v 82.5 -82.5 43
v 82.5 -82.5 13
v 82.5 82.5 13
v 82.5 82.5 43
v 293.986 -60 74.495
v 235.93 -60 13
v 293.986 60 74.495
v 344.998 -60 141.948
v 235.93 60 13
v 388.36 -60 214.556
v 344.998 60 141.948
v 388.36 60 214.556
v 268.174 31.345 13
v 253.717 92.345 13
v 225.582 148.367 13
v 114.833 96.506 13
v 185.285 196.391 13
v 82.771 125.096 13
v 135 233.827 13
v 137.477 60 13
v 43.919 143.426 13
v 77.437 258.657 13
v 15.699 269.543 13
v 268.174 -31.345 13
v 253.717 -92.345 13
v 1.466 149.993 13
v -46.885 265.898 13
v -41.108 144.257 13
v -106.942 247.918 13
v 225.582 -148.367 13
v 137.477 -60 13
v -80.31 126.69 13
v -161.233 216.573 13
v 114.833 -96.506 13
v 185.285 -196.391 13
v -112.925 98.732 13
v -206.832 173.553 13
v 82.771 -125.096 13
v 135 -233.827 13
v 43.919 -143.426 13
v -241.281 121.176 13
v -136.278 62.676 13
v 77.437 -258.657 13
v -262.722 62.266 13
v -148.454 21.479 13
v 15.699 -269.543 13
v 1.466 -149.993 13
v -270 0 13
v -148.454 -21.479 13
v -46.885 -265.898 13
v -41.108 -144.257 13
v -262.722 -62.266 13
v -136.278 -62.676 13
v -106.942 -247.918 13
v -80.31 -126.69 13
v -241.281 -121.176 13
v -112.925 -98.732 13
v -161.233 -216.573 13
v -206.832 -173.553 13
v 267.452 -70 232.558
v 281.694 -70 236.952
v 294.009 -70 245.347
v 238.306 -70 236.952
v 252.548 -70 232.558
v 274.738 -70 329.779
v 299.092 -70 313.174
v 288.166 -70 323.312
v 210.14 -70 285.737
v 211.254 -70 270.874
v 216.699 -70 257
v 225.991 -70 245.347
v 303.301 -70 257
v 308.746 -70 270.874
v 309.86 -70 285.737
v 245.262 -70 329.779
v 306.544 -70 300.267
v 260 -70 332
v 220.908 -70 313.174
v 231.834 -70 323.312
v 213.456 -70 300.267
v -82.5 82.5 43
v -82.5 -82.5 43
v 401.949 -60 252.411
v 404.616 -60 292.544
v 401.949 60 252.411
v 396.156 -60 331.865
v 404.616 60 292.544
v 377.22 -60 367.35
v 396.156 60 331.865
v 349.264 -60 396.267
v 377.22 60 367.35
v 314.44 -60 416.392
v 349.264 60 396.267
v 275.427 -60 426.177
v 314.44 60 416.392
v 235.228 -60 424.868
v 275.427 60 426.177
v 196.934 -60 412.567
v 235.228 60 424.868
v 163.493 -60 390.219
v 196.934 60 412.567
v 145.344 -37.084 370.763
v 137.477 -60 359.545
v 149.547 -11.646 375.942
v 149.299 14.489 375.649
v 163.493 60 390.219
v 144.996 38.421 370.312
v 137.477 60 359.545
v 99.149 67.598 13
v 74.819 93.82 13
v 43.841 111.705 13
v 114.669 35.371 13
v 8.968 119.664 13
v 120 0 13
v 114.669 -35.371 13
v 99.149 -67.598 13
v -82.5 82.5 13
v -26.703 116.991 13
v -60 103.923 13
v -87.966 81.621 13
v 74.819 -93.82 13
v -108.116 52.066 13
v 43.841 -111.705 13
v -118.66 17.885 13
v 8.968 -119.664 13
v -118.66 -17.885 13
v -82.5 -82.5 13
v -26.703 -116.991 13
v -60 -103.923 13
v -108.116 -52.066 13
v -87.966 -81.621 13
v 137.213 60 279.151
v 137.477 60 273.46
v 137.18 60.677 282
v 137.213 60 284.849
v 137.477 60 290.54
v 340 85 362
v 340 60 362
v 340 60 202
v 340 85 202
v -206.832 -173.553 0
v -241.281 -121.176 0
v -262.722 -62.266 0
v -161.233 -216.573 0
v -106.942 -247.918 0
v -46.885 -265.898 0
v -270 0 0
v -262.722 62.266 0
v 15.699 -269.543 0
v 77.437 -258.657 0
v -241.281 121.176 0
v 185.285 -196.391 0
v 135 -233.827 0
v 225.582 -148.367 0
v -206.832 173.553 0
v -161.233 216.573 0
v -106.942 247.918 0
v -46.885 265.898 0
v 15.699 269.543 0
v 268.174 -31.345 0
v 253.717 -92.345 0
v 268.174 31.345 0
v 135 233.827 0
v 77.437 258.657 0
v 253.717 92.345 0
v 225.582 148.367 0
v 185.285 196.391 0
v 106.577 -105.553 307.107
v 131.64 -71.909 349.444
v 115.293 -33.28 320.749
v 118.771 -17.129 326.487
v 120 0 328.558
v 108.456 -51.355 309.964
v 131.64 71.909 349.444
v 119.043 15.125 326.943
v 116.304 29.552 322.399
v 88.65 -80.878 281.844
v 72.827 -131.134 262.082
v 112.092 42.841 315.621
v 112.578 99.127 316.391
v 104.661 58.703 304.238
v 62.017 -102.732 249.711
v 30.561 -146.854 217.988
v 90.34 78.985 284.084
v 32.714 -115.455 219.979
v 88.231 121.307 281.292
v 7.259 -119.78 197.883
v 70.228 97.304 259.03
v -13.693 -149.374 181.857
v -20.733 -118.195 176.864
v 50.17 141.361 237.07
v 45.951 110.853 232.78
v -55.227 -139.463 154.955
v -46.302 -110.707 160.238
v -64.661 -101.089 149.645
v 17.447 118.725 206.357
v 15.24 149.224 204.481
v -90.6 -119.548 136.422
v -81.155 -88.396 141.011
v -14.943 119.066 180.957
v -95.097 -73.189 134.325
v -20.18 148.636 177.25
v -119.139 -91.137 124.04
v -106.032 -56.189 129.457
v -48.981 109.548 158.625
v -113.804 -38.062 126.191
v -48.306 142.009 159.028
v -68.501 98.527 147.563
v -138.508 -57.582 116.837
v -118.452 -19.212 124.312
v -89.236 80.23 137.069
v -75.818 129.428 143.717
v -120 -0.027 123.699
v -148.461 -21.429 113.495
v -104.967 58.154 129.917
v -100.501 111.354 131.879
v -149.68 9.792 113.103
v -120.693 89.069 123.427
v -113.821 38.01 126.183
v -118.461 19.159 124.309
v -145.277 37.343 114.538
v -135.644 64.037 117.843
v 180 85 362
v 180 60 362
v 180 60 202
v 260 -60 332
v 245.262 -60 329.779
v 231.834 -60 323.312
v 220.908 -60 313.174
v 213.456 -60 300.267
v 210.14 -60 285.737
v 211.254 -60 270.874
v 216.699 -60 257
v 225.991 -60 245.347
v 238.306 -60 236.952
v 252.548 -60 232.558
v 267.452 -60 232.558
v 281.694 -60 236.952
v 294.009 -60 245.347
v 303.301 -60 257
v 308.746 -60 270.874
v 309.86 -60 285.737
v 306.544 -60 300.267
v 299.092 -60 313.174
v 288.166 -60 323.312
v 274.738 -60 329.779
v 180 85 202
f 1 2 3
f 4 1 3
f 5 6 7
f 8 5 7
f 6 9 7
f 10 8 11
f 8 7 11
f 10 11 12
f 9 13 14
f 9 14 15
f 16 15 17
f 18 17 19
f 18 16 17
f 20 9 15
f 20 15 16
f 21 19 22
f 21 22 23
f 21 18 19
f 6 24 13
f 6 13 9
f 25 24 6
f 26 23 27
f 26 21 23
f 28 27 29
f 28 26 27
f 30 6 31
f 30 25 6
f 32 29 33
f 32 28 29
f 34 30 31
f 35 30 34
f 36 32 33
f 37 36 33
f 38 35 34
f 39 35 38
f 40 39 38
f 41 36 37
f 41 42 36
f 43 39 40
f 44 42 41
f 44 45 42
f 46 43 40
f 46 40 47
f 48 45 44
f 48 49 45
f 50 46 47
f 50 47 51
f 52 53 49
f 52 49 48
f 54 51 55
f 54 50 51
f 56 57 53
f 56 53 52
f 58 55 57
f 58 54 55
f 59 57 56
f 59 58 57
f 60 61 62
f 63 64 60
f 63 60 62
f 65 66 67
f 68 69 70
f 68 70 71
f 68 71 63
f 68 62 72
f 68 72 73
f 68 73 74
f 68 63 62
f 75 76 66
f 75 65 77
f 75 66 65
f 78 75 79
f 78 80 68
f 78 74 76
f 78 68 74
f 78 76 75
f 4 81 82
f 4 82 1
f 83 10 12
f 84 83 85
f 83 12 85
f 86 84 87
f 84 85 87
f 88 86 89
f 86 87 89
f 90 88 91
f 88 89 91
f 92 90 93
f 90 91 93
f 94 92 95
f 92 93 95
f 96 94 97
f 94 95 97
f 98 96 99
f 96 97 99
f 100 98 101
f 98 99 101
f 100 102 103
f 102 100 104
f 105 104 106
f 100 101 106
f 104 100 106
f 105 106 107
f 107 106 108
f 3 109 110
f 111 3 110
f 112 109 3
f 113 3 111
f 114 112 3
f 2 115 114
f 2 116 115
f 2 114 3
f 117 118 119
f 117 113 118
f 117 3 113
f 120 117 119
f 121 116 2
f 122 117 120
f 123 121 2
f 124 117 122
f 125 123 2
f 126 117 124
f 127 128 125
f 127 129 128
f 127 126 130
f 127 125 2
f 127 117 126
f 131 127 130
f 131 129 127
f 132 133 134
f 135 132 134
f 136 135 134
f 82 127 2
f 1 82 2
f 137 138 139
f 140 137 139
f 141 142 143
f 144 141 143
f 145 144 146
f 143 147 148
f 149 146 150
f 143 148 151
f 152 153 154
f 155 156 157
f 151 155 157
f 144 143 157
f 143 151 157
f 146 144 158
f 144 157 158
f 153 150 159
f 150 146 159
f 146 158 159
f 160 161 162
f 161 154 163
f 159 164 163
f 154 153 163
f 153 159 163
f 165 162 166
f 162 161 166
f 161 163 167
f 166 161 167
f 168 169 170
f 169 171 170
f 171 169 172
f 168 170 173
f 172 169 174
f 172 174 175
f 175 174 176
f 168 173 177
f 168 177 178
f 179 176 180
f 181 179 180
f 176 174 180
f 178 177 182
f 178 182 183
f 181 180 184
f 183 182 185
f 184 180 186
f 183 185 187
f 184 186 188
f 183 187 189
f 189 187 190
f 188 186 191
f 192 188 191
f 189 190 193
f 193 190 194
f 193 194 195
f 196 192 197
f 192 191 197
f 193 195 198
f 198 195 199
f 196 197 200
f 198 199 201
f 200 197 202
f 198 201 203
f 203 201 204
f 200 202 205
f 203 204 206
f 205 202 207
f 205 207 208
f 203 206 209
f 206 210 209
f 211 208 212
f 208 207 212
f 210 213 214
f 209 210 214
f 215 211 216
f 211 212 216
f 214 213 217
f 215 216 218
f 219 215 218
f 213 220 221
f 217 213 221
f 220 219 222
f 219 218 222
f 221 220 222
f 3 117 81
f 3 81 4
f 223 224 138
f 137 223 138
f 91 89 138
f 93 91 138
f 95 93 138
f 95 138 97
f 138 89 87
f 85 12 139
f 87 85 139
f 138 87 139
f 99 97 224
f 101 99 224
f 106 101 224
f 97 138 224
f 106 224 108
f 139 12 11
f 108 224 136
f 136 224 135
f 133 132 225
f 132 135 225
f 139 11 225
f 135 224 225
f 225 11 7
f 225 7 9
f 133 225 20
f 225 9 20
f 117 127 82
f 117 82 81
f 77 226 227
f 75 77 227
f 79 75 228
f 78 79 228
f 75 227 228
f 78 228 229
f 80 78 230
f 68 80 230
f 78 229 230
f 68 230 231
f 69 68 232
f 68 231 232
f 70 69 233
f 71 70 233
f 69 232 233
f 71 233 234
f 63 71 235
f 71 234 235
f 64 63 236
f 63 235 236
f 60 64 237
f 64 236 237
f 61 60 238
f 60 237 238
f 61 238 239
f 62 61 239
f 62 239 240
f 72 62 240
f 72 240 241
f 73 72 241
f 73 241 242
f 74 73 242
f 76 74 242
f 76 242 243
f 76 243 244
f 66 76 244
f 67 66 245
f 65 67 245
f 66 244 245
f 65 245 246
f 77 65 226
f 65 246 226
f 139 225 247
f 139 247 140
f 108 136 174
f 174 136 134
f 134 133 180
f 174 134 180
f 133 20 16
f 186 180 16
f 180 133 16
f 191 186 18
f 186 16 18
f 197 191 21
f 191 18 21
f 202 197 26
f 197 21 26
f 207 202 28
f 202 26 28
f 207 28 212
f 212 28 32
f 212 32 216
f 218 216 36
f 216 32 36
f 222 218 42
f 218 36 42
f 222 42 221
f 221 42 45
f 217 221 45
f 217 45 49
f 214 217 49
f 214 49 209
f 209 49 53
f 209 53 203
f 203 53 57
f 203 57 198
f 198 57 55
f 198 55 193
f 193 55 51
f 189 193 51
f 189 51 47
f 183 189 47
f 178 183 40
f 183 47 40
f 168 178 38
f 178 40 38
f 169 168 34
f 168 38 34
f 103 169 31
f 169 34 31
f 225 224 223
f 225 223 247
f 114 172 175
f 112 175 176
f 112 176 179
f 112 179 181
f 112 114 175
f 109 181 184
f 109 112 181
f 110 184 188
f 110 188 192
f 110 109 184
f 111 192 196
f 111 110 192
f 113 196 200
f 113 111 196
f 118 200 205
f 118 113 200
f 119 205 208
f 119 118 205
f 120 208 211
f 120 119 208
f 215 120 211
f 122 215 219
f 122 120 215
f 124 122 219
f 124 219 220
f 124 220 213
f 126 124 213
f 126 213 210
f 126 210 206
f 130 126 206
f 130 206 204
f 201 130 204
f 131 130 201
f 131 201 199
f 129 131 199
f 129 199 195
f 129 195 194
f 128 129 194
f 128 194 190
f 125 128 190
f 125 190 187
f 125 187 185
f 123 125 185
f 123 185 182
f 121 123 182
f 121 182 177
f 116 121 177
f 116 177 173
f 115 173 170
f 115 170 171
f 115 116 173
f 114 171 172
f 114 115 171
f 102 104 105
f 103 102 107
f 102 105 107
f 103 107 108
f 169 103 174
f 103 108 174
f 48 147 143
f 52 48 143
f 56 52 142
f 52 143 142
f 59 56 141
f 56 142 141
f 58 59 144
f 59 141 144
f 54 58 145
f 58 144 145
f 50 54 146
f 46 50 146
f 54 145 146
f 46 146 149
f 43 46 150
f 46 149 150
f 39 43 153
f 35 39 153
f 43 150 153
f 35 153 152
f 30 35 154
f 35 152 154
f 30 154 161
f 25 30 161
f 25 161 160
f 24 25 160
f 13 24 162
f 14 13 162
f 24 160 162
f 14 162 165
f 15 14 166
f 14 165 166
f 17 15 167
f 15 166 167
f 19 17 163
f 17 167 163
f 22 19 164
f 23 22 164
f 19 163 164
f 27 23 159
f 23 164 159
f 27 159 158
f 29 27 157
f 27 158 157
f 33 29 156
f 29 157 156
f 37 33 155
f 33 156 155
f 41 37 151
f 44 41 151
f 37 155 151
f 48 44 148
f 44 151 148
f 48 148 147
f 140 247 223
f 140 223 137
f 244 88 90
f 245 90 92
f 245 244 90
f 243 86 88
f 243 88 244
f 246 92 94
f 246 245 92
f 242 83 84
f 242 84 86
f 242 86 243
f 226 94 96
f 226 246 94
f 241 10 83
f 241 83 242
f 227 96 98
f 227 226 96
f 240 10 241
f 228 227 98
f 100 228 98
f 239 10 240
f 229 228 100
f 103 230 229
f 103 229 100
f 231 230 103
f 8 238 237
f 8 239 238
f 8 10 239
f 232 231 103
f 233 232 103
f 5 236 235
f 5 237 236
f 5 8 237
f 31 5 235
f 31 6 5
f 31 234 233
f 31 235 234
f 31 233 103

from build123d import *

# Parameters (mm, degrees)
SKETCH_1_R           = 270
EXTRUDE_1_DEPTH      = 13
SKETCH_2_R           = 150
SKETCH_2_R_2         = 120
EXTRUDE_2_DEPTH      = 400
CUT_EXTRUDE_1_DEPTH  = 220
EXTRUDE_3_DEPTH      = 60
SKETCH_27_W          = 165
SKETCH_27_H          = 165
EXTRUDE_14_DEPTH     = 30
SKETCH_51_R          = 122.82
CUT_EXTRUDE_20_DEPTH = 25
SKETCH_52_W          = 160
SKETCH_52_H          = 160
EXTRUDE_33_DEPTH     = 25
SKETCH_53_R          = 50
EXTRUDE_34_DEPTH     = 10


with BuildPart() as part:
    # 草图1 → 凸台-拉伸1 (new body)
    with BuildSketch(Plane.XY):
        with Locations(Location((0, 0, 0), (0, 0, 180))):
            Circle(SKETCH_1_R)
    extrude(amount=EXTRUDE_1_DEPTH)

    # 草图2 → 凸台-拉伸2 (add)
    with BuildSketch(Plane.XY):
        Circle(SKETCH_2_R)
        Circle(SKETCH_2_R_2, mode=Mode.SUBTRACT)
    extrude(amount=EXTRUDE_2_DEPTH)

    # 草图4 → 切除-拉伸1 (cut, symmetric)
    with BuildSketch(Plane(origin=(0, 0, 0), x_dir=(1, 0, 0), z_dir=(0, 1, 0))):
        with BuildLine():
            Line((-150, -113), (-150, -400))
            Line((-150, -400), (175.732568569, -400))
            ThreePointArc((175.732568569, -400), (150.72256284, -377.307091697), (131.640141985, -349.444398214))
            ThreePointArc((131.640141985, -349.444398214), (14.085885106, -203.509183955), (-150, -113))
        make_face()
    extrude(amount=CUT_EXTRUDE_1_DEPTH, both=True, mode=Mode.SUBTRACT)

    # 草图5 → 凸台-拉伸3 (add, symmetric)
    with BuildSketch(Plane(origin=(0, 0, 0), x_dir=(1, 0, 0), z_dir=(0, 1, 0))):
        with BuildLine():
            Line((131.640141985, -13), (235.929592589, -13))
            ThreePointArc((235.929592589, -13), (320.412645509, -107.525028653), (388.359858015, -214.555601786))
            ThreePointArc((388.359858015, -214.555601786), (327.444398214, -410.359858015), (131.640141985, -349.444398214))
            Line((131.640141985, -349.444398214), (131.640141985, -13))
        make_face()
    extrude(amount=EXTRUDE_3_DEPTH, both=True)

    # 草图27 → 凸台-拉伸14 (add)
    with BuildSketch(Plane.XY.offset(13)):
        Rectangle(SKETCH_27_W, SKETCH_27_H)
    extrude(amount=EXTRUDE_14_DEPTH)

    # 草图51 → 切除-拉伸20 (cut)
    with BuildSketch(Plane(origin=(0, 60, 0), x_dir=(1, 0, 0), z_dir=(0, 1, 0))):
        with Locations((260, -282)):
            Circle(SKETCH_51_R)
    extrude(amount=CUT_EXTRUDE_20_DEPTH, mode=Mode.SUBTRACT)

    # 草图52 → 凸台-拉伸33 (add)
    with BuildSketch(Plane(origin=(0, 60, 0), x_dir=(1, 0, 0), z_dir=(0, 1, 0))):
        with Locations((260, -282)):
            Rectangle(SKETCH_52_W, SKETCH_52_H)
    extrude(amount=EXTRUDE_33_DEPTH)

    # 草图53 → 凸台-拉伸34 (add)
    with BuildSketch(Plane(origin=(0, -60, 0), x_dir=(-1, 0, 0), z_dir=(0, -1, 0))):
        with Locations(Location((-260, -282, 0), (0, 0, 270))):
            Circle(SKETCH_53_R)
    extrude(amount=EXTRUDE_34_DEPTH)


solid = part.part
